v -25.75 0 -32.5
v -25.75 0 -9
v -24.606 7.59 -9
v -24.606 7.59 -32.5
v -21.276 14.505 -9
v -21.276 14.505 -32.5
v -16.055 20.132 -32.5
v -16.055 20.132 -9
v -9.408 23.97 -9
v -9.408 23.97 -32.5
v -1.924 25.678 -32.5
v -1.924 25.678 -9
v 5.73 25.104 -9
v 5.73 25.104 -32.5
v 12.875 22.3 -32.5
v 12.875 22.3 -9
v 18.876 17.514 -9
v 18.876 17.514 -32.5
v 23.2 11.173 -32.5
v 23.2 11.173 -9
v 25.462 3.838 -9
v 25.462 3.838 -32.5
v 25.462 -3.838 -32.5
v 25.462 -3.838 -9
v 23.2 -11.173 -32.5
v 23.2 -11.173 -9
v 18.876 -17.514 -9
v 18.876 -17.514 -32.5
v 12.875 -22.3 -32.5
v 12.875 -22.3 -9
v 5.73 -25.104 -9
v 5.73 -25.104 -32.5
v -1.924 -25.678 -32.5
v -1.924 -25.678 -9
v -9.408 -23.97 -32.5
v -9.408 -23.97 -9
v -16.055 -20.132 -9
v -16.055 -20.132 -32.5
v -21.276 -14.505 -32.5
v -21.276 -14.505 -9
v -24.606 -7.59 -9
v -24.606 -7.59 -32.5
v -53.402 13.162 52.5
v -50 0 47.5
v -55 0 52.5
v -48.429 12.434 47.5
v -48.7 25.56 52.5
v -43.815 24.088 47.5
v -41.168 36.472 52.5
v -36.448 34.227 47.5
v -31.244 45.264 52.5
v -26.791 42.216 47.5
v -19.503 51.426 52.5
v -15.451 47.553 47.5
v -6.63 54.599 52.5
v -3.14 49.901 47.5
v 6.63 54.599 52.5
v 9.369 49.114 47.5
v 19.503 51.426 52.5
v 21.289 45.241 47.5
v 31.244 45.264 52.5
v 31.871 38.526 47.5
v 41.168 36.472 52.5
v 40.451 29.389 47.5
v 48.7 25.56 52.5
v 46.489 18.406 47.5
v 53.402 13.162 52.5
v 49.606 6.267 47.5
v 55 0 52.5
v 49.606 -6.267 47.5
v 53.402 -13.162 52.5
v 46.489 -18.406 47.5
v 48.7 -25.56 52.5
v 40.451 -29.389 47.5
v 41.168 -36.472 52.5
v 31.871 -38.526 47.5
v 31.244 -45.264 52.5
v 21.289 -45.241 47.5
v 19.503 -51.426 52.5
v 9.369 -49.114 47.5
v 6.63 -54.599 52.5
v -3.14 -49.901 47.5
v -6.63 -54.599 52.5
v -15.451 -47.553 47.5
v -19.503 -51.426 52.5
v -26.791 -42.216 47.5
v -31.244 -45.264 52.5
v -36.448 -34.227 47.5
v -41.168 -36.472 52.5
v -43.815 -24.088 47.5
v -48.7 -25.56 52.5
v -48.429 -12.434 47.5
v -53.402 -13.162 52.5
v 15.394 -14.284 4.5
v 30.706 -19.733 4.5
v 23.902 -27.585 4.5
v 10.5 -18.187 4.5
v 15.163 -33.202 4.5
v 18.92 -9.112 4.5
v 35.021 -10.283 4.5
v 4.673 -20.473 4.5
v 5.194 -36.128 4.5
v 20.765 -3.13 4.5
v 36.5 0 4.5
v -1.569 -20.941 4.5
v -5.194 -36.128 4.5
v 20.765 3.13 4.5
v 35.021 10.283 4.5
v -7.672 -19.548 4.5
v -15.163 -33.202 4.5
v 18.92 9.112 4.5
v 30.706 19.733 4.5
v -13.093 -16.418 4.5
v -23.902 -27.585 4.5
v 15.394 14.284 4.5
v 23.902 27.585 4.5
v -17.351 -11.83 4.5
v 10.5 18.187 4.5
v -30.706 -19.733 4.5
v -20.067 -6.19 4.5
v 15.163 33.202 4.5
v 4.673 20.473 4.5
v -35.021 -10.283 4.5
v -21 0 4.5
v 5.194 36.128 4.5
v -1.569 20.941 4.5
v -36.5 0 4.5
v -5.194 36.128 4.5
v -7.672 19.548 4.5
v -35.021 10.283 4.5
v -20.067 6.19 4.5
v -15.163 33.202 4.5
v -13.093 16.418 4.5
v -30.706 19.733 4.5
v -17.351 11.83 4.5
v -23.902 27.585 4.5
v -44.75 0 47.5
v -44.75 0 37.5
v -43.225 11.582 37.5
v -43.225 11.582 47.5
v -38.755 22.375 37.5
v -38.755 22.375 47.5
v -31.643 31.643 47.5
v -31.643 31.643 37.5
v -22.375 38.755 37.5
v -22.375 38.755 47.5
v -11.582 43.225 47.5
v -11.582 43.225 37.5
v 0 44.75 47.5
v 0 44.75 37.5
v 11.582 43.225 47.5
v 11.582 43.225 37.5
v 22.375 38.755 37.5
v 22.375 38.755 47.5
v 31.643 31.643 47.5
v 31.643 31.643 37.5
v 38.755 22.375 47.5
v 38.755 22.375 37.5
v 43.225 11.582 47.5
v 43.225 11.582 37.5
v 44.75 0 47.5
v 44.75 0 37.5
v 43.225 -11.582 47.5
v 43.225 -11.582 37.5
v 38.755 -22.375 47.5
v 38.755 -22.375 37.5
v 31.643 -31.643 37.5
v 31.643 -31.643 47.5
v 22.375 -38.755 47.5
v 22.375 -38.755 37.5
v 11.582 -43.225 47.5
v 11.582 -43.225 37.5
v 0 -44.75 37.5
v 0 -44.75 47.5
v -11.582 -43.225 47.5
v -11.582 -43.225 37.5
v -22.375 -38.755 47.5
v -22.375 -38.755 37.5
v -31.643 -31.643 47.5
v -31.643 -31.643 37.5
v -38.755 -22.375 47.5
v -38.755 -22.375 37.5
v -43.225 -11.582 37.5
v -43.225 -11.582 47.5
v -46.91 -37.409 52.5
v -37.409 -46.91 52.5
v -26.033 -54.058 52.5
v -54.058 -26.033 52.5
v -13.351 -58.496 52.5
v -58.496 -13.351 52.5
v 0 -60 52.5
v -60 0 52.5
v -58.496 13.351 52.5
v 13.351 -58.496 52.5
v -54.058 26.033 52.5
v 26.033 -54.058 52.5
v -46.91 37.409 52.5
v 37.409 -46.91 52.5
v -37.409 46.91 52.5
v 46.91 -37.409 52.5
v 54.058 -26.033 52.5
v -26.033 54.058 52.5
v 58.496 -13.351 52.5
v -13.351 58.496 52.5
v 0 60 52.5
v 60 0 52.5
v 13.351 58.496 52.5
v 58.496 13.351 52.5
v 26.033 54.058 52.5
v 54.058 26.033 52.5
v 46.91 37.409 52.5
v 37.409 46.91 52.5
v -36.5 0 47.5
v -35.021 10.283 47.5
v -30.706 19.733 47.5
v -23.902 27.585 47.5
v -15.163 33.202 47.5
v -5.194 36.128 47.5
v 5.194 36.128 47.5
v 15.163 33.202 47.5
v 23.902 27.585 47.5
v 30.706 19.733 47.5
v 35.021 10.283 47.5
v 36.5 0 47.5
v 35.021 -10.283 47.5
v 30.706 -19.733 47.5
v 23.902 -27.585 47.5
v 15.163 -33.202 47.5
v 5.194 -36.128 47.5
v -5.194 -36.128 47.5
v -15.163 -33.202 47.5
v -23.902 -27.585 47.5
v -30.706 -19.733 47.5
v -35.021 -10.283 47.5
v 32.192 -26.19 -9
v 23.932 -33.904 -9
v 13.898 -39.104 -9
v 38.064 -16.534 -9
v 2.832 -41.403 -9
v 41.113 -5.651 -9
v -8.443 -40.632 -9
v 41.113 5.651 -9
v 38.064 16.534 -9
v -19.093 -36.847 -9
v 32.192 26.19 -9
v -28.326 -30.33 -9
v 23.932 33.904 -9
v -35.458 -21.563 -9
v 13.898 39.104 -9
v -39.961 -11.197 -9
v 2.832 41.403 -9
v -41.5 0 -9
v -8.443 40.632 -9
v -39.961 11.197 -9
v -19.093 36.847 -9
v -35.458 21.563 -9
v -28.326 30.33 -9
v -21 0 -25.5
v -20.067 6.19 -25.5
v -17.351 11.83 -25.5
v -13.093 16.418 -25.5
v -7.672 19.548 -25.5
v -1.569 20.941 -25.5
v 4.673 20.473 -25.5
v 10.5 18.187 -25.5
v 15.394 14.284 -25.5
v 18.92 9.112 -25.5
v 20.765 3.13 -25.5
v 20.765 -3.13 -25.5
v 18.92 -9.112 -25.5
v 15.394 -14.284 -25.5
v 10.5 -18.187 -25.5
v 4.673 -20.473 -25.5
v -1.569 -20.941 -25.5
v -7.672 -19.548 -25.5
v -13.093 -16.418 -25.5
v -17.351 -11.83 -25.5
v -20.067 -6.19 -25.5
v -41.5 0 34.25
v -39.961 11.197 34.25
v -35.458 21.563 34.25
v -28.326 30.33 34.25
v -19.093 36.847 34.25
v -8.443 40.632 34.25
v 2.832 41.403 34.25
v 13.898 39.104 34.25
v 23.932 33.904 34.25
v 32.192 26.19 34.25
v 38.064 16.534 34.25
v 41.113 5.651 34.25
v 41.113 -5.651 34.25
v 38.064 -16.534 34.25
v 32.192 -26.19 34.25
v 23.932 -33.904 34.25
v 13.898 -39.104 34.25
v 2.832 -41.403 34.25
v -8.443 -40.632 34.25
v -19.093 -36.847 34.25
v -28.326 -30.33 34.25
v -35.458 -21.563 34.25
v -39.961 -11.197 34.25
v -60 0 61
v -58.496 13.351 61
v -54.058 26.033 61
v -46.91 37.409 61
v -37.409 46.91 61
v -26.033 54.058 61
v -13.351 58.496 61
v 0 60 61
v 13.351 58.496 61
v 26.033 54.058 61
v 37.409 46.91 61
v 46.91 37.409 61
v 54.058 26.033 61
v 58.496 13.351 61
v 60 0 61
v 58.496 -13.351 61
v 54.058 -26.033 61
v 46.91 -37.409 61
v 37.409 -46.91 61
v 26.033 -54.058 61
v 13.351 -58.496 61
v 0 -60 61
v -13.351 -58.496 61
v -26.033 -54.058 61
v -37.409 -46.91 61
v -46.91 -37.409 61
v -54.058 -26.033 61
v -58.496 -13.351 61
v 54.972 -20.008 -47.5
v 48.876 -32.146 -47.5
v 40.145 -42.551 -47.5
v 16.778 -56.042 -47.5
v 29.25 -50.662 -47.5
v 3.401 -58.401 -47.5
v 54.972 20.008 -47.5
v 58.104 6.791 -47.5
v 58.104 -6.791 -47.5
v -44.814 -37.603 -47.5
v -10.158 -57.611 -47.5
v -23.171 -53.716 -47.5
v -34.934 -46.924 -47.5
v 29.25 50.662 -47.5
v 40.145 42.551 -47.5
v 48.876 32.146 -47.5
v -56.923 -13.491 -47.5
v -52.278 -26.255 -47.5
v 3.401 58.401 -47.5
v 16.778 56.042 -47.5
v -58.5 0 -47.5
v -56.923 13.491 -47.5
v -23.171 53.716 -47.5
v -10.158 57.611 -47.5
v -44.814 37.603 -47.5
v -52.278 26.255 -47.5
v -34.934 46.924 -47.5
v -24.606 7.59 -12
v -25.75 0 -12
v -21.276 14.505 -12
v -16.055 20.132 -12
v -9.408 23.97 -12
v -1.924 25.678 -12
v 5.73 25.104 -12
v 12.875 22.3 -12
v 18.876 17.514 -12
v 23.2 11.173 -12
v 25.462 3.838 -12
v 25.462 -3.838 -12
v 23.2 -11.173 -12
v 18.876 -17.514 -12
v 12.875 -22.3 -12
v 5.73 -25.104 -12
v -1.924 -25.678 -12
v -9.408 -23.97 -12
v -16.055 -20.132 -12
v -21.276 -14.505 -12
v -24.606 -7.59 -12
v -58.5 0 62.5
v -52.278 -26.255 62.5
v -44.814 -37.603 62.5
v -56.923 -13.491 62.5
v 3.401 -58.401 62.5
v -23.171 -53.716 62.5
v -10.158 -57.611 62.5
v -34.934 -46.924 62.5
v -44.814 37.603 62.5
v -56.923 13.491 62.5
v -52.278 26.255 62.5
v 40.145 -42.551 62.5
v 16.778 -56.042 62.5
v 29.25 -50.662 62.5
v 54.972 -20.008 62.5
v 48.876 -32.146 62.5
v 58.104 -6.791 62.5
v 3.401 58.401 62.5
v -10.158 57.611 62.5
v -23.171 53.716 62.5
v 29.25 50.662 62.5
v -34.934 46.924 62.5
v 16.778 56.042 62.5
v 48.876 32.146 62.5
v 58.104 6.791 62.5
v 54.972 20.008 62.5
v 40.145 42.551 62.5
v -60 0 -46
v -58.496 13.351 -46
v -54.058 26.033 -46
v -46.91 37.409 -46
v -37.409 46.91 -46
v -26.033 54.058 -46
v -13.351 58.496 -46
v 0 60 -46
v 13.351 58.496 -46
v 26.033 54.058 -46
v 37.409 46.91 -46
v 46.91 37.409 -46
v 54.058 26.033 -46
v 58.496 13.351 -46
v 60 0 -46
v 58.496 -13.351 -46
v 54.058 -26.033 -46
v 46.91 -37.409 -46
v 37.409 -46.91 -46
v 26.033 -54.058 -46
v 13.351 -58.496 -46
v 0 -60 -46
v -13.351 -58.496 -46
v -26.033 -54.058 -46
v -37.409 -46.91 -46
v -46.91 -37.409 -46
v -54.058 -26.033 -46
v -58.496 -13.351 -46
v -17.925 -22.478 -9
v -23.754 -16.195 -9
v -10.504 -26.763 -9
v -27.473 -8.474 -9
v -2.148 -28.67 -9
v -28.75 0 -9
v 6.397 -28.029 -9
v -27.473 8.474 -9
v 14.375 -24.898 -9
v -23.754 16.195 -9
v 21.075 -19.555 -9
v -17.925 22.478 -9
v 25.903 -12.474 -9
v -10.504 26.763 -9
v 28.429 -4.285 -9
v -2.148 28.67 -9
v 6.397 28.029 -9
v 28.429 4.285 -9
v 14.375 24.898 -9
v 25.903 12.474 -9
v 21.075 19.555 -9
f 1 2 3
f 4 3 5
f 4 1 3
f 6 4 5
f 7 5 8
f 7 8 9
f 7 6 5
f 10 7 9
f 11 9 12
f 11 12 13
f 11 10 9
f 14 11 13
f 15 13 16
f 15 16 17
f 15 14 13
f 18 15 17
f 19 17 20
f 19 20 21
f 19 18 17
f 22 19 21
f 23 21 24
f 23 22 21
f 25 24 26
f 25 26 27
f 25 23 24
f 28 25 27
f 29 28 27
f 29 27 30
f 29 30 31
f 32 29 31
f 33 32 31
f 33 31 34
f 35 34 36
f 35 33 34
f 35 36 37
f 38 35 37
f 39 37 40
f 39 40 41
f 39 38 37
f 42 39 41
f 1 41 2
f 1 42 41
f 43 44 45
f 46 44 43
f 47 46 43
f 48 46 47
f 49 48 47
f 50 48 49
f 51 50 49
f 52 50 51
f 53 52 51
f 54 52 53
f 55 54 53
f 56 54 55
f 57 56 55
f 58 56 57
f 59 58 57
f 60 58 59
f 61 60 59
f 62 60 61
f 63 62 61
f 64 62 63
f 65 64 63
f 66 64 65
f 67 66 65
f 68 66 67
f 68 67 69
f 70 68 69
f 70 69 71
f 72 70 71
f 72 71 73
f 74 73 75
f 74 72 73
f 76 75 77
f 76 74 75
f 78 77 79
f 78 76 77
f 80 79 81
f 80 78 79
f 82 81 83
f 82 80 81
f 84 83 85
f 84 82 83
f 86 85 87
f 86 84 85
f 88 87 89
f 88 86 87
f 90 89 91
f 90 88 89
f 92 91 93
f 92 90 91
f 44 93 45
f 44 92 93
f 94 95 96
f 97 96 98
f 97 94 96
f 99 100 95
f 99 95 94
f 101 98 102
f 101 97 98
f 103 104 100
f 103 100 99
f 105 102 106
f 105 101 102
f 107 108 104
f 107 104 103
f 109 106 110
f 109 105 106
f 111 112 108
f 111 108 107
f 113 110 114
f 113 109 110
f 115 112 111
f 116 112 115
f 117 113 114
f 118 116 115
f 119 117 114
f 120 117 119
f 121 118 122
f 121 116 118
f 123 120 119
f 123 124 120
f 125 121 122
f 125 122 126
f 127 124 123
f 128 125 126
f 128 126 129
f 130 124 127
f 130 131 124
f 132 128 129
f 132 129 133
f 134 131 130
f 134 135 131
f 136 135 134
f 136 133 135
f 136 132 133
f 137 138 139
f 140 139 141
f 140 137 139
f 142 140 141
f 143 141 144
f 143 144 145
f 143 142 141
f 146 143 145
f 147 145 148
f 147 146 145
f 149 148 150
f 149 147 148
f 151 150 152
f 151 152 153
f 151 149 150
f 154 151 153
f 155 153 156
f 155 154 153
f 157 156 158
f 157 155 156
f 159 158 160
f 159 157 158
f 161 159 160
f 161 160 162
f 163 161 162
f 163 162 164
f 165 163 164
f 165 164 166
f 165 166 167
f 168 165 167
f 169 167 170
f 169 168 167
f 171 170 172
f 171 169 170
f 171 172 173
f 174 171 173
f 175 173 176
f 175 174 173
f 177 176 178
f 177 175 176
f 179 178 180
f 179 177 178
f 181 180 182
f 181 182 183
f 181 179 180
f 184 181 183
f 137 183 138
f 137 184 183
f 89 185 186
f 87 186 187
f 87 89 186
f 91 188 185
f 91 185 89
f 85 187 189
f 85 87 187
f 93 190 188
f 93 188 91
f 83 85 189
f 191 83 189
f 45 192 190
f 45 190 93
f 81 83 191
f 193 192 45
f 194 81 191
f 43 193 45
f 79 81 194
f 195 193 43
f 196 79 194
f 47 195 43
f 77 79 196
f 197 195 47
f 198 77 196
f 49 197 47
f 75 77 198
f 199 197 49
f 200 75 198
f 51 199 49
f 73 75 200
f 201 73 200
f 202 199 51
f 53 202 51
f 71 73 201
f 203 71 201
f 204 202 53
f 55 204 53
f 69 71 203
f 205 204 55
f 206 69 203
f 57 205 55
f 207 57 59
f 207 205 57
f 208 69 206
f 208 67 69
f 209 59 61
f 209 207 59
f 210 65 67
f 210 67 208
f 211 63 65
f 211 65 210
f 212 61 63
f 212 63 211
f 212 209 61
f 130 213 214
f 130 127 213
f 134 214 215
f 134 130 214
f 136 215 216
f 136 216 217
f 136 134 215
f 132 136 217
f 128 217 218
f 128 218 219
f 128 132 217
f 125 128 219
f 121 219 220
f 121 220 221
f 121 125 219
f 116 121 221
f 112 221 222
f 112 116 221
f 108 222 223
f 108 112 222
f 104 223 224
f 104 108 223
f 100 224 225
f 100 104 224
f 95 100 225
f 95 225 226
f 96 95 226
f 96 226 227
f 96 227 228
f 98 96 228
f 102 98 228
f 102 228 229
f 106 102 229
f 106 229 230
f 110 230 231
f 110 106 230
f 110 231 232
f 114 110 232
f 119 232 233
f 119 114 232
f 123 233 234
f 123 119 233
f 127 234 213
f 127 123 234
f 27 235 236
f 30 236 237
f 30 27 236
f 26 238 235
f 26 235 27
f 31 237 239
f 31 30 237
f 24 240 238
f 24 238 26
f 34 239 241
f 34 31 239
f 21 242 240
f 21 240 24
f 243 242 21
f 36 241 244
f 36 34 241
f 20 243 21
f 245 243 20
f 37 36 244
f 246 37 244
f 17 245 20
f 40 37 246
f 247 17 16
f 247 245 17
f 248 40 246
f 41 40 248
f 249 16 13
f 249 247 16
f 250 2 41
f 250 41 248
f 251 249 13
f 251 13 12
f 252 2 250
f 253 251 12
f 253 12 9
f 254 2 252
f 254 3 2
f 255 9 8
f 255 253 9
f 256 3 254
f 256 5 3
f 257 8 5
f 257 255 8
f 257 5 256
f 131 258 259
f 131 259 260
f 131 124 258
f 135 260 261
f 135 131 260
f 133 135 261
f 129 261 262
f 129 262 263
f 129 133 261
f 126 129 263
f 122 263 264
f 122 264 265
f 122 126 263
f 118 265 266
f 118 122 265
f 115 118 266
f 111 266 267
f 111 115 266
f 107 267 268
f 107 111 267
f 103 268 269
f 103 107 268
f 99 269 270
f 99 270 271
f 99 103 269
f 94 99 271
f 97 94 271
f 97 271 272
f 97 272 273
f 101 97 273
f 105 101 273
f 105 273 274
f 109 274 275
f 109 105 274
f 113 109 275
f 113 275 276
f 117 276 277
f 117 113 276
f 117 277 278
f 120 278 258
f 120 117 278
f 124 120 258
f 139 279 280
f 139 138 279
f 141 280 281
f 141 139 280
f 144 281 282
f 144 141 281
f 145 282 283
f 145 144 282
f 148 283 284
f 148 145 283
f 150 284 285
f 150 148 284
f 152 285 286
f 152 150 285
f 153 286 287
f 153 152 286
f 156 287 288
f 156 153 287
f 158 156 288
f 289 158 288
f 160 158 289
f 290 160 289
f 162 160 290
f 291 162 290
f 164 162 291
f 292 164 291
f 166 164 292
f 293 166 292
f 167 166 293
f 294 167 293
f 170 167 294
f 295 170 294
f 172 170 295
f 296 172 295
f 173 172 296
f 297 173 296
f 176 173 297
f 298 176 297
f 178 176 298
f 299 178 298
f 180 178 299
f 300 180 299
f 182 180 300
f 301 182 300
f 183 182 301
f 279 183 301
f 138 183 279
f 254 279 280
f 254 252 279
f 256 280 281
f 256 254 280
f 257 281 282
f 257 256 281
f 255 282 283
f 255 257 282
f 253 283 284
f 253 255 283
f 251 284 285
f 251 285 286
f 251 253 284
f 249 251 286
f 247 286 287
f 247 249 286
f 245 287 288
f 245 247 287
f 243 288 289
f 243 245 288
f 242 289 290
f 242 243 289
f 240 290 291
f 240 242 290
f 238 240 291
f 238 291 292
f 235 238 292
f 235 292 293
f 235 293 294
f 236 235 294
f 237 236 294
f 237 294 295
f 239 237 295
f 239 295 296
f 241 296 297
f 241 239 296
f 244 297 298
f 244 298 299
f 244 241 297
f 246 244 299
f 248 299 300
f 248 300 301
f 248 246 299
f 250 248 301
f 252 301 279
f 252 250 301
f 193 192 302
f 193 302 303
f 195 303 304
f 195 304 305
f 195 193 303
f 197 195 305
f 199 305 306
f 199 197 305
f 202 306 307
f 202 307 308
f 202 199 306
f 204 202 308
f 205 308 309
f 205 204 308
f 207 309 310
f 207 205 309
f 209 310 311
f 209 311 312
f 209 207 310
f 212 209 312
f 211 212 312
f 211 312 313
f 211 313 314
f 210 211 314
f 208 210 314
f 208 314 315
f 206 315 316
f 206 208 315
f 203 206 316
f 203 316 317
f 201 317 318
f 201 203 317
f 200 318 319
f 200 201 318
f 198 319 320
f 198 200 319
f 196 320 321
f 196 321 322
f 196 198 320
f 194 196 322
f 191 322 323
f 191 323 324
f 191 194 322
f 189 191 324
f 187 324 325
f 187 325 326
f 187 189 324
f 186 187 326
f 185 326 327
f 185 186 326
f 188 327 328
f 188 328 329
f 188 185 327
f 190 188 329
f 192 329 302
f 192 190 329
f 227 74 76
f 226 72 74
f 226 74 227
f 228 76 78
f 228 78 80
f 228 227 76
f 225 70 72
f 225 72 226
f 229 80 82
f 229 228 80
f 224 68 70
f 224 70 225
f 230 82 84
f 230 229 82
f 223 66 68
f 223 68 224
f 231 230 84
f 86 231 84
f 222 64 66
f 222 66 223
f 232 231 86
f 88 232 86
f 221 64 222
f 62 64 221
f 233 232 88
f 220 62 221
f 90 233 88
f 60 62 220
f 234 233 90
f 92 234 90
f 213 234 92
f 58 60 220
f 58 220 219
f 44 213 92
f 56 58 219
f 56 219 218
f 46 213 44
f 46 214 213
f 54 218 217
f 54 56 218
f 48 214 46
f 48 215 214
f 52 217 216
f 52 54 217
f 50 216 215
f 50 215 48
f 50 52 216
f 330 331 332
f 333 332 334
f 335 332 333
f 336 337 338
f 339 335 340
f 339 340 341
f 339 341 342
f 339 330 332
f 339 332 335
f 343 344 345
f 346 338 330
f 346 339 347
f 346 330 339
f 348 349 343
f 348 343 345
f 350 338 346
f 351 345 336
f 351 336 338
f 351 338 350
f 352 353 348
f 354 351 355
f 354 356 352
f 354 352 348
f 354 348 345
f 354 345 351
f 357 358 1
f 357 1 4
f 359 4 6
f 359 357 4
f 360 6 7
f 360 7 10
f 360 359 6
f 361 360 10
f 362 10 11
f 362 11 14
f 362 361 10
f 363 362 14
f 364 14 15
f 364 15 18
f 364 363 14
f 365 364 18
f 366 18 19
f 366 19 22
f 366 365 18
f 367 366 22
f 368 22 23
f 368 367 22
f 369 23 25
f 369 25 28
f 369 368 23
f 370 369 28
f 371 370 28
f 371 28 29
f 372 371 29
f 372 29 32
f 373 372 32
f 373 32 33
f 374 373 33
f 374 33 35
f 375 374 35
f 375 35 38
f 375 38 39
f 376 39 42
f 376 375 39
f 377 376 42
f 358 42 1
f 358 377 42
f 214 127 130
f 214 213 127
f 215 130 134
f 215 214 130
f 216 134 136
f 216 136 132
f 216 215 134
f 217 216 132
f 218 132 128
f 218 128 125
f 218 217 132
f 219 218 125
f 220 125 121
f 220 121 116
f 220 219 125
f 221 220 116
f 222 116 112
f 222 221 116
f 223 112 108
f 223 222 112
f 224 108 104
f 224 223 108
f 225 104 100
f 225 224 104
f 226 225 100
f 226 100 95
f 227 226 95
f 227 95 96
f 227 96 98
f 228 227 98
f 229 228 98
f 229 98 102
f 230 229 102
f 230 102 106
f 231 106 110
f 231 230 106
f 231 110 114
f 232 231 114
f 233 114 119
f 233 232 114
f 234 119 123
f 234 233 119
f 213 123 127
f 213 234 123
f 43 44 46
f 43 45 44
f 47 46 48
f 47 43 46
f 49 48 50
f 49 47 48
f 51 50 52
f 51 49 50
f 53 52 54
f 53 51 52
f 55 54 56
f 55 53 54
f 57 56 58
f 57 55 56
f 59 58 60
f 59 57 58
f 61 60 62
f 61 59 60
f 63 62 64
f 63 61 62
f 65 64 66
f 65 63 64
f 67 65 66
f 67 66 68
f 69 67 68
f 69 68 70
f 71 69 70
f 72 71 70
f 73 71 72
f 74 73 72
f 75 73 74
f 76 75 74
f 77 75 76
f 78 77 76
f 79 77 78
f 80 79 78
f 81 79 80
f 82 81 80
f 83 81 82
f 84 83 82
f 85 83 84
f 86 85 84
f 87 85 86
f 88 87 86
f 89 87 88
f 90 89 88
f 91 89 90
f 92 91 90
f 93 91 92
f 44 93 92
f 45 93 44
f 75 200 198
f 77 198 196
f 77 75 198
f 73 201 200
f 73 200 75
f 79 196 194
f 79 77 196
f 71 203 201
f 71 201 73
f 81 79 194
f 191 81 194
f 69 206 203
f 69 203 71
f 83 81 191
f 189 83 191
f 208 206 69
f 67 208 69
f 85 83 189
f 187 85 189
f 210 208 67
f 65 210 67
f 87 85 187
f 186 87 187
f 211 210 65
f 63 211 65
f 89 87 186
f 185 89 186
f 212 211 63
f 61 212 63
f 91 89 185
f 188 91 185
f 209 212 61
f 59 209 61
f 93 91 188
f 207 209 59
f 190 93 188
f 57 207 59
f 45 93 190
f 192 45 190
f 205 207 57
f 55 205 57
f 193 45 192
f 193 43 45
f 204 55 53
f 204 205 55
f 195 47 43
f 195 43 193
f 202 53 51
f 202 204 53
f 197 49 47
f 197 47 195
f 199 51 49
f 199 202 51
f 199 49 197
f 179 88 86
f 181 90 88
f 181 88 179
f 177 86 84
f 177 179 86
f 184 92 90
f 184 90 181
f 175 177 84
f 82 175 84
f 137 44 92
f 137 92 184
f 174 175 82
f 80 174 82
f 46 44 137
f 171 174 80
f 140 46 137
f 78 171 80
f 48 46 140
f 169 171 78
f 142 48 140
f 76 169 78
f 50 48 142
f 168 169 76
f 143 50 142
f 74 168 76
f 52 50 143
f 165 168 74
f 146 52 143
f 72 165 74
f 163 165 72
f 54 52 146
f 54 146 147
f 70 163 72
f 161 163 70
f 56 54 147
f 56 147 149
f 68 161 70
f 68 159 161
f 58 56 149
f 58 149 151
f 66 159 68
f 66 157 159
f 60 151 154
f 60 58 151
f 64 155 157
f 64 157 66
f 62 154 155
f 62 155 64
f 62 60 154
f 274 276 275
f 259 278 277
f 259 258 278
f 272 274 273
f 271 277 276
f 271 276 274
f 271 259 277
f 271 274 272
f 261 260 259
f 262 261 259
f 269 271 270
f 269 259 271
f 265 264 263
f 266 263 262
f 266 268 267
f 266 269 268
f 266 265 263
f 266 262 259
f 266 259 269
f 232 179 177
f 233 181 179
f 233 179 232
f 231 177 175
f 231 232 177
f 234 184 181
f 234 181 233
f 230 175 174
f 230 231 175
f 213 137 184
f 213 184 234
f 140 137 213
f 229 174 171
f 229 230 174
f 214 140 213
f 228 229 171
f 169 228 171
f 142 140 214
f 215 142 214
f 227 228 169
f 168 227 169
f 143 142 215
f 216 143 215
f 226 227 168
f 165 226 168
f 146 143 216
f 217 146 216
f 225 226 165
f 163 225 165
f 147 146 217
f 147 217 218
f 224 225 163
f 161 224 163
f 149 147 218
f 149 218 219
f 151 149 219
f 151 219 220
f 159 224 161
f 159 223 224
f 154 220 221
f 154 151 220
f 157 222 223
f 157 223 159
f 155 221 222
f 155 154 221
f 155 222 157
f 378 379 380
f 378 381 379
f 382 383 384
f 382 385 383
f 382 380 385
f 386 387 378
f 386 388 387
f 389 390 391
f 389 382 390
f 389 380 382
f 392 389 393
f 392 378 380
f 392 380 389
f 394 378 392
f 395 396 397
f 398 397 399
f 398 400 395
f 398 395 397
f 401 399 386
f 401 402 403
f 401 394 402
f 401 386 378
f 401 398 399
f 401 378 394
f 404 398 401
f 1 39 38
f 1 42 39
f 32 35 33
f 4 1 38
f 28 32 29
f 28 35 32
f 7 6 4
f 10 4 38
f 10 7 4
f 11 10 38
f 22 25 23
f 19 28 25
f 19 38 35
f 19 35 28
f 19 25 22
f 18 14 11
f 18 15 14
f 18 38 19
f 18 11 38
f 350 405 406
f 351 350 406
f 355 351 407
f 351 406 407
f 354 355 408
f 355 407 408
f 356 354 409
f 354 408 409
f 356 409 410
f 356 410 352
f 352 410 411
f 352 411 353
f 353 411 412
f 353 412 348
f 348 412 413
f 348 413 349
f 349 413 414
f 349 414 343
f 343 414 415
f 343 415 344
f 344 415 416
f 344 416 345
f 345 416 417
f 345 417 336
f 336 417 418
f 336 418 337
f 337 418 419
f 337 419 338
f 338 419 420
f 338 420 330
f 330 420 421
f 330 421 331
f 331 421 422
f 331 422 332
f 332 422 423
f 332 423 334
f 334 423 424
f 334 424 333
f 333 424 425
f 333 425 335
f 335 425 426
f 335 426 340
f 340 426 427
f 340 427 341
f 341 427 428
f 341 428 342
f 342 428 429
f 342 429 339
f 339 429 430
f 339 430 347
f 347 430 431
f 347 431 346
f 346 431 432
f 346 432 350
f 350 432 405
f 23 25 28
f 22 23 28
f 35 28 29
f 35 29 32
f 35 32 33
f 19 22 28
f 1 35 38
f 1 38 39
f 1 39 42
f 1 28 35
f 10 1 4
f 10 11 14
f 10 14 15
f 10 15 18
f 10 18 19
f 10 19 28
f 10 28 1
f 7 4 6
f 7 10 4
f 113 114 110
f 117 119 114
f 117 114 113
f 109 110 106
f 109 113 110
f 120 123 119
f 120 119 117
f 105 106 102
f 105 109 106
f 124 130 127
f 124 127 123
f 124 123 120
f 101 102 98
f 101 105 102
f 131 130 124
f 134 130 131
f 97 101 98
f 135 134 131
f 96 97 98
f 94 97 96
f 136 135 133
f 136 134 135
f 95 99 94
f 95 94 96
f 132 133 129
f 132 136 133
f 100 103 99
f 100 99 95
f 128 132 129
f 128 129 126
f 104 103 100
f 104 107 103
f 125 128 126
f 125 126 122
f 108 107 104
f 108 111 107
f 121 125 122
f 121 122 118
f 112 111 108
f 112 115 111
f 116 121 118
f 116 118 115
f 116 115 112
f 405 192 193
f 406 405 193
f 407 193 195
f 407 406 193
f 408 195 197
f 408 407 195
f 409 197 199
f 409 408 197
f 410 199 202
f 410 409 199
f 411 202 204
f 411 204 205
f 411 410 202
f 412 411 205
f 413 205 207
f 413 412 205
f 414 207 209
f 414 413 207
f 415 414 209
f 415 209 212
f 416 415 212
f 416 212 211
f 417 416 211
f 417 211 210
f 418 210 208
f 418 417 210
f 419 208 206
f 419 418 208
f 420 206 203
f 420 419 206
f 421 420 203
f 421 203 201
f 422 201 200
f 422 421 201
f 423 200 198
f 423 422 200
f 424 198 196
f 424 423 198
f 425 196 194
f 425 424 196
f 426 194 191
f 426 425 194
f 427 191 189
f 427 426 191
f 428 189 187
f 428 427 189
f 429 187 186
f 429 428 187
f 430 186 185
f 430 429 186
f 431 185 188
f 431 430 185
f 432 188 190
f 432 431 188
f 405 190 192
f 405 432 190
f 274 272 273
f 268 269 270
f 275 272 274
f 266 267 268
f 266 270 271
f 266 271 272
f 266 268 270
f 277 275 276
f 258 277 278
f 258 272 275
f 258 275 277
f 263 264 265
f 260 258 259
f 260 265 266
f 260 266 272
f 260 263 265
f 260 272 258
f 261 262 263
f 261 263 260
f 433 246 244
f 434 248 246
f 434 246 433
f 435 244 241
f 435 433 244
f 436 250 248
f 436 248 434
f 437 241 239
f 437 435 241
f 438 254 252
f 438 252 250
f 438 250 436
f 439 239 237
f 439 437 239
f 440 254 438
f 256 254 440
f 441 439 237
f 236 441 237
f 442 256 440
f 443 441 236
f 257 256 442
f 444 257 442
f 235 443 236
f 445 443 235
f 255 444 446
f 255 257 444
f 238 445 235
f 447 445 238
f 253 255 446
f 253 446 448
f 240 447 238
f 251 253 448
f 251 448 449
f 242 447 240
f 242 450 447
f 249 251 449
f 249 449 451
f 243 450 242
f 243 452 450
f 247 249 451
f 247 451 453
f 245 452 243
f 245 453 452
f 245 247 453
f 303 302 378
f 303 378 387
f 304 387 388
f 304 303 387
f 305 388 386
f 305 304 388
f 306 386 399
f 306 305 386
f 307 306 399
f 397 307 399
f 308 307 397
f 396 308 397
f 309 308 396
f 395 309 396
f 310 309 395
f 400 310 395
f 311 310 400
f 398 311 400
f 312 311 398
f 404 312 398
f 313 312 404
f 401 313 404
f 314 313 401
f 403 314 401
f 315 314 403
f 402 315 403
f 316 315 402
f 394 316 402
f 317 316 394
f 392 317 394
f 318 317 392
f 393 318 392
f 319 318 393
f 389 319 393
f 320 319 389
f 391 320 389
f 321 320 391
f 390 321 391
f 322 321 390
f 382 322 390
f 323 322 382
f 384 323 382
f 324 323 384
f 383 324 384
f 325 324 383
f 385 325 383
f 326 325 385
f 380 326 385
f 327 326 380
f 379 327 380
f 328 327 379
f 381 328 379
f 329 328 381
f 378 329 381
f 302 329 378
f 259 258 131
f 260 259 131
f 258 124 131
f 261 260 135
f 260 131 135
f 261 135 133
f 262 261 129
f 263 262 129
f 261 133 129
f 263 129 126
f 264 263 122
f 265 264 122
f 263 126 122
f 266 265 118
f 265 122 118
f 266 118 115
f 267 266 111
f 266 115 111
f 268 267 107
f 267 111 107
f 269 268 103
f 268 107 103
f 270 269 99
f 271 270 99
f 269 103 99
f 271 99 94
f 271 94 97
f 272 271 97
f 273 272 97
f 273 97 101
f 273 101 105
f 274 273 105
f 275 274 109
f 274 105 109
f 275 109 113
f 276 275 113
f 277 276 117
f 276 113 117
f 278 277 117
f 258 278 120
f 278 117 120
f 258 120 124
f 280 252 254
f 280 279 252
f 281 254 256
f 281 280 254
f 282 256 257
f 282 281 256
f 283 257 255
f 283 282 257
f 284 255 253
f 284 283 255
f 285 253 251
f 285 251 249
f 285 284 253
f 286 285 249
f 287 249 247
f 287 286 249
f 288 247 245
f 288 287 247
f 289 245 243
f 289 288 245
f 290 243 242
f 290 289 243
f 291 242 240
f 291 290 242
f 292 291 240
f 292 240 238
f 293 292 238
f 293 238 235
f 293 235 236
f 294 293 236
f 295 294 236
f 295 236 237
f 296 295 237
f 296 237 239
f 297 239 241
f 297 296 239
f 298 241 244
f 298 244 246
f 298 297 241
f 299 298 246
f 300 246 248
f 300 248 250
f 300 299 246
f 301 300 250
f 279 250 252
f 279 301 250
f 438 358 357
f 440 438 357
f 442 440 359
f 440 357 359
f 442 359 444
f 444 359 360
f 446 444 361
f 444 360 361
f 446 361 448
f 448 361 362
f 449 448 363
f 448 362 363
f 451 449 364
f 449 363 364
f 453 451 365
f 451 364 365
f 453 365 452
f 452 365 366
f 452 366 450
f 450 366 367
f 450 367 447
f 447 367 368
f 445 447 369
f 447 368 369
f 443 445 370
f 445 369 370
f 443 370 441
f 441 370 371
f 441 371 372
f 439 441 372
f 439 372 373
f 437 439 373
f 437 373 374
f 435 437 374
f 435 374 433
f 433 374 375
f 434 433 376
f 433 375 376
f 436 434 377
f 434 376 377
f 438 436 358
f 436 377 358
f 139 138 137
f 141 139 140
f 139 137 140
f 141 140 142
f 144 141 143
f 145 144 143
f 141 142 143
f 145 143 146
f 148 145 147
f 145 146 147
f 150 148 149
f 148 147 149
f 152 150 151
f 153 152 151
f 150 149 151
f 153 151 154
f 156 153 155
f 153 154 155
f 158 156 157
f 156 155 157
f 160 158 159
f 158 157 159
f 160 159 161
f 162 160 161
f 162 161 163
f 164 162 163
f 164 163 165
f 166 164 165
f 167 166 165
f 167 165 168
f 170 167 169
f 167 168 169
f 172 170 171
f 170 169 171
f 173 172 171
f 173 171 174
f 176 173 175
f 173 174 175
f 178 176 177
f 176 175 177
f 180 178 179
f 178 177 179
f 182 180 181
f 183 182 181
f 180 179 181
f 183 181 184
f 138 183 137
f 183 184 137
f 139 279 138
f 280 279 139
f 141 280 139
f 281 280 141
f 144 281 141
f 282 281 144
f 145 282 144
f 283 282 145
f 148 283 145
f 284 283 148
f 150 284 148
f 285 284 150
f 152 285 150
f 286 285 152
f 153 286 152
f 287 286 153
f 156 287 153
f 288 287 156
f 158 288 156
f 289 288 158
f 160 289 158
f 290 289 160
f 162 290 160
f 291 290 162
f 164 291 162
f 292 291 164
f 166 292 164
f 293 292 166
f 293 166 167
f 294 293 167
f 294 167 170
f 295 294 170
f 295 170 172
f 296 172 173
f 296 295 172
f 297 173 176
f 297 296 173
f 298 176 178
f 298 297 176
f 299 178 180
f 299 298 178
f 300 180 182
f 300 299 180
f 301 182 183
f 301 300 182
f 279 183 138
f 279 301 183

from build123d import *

# Parameters (mm, degrees)
F0_W    = 36.5
F0_H    = 10
F0_W_2  = 21
F0_H_2  = 21
F0_H_3  = 30
F0_W_3  = 3.25
F0_W_4  = 5
F4_SIZE = 1.5
F5_SIZE = 1.5
F6_SIZE = 3


# Not quite as in the source:
# - a feature names something its author has since deleted; it is built from what else it names


with BuildPart() as f1:
    # F0 (on Front) → F1 (revolve)
    with BuildSketch(Plane.XZ):
        Polygon((-60, 47.5), (-60, 37.5), (-44.75, 37.5), (-44.75, 47.5), (-50, 47.5), align=None)
        Polygon((-60, -47.5), (0, -47.5), (0, -32.5), (-25.75, -32.5), (-25.75, -9), (-41.5, -9), (-41.5, 32.5), (-41.5, 34.25), (-44.75, 37.5), (-60, 37.5), align=None)
        Polygon((-55, 52.5), (-60, 52.5), (-60, 47.5), (-50, 47.5), align=None)
    revolve(axis=Axis((0, 0, 13.6922076344), (0, 0, -1)))

    # F5
    f5_edges = [f1.edges().sort_by_distance(p)[0] for p in [
        (60, 0, -47.5),
    ]]
    chamfer(f5_edges, length=F5_SIZE)

    # F6
    f6_edges = [f1.edges().sort_by_distance(p)[0] for p in [
        (25.75, 0, -9),
    ]]
    chamfer(f6_edges, length=F6_SIZE)


with BuildPart() as f2:
    # F0 (on Front) → F2 (revolve)
    with BuildSketch(Plane.XZ):
        Polygon((0, 25.5), (0, 37.5), (-36.5, 37.5), (-36.5, 25.5), (-36.5, 4.5), (-21, 4.5), (-21, 25.5), align=None)
        with Locations((-18.25, 42.5)):
            Rectangle(F0_W, F0_H)
        with Locations((-10.5, 15)):
            Rectangle(F0_W_2, F0_H_2)
        with Locations((-10.5, -10.5)):
            Rectangle(F0_W_2, F0_H_3)
        Polygon((0, 47.5), (0, 62.5), (-60, 62.5), (-60, 52.5), (-55, 52.5), (-50, 47.5), (-44.75, 47.5), (-41.5, 47.5), (-36.5, 47.5), align=None)
    revolve(axis=Axis((0, 0, 13.6922076344), (0, 0, -1)))

    # F4
    f4_edges = [f2.edges().sort_by_distance(p)[0] for p in [
        (60, 0, 62.5),
    ]]
    chamfer(f4_edges, length=F4_SIZE)


with BuildPart() as f3:
    # F0 (on Front) → F3 (revolve)
    with BuildSketch(Plane.XZ):
        with Locations((-43.125, 42.5)):
            Rectangle(F0_W_3, F0_H)
        with Locations((-39, 42.5)):
            Rectangle(F0_W_4, F0_H)
        Polygon((-25.75, -32.5), (0, -32.5), (0, -25.5), (-21, -25.5), (-21, 4.5), (-36.5, 4.5), (-36.5, 25.5), (-36.5, 37.5), (-41.5, 37.5), (-41.5, 34.25), (-41.5, 32.5), (-41.5, -9), (-25.75, -9), align=None)
        Polygon((-41.5, 37.5), (-44.75, 37.5), (-41.5, 34.25), align=None)
    revolve(axis=Axis((0, 0, 13.6922076344), (0, 0, -1)))


solid = Compound([f1.part, f2.part, f3.part])
